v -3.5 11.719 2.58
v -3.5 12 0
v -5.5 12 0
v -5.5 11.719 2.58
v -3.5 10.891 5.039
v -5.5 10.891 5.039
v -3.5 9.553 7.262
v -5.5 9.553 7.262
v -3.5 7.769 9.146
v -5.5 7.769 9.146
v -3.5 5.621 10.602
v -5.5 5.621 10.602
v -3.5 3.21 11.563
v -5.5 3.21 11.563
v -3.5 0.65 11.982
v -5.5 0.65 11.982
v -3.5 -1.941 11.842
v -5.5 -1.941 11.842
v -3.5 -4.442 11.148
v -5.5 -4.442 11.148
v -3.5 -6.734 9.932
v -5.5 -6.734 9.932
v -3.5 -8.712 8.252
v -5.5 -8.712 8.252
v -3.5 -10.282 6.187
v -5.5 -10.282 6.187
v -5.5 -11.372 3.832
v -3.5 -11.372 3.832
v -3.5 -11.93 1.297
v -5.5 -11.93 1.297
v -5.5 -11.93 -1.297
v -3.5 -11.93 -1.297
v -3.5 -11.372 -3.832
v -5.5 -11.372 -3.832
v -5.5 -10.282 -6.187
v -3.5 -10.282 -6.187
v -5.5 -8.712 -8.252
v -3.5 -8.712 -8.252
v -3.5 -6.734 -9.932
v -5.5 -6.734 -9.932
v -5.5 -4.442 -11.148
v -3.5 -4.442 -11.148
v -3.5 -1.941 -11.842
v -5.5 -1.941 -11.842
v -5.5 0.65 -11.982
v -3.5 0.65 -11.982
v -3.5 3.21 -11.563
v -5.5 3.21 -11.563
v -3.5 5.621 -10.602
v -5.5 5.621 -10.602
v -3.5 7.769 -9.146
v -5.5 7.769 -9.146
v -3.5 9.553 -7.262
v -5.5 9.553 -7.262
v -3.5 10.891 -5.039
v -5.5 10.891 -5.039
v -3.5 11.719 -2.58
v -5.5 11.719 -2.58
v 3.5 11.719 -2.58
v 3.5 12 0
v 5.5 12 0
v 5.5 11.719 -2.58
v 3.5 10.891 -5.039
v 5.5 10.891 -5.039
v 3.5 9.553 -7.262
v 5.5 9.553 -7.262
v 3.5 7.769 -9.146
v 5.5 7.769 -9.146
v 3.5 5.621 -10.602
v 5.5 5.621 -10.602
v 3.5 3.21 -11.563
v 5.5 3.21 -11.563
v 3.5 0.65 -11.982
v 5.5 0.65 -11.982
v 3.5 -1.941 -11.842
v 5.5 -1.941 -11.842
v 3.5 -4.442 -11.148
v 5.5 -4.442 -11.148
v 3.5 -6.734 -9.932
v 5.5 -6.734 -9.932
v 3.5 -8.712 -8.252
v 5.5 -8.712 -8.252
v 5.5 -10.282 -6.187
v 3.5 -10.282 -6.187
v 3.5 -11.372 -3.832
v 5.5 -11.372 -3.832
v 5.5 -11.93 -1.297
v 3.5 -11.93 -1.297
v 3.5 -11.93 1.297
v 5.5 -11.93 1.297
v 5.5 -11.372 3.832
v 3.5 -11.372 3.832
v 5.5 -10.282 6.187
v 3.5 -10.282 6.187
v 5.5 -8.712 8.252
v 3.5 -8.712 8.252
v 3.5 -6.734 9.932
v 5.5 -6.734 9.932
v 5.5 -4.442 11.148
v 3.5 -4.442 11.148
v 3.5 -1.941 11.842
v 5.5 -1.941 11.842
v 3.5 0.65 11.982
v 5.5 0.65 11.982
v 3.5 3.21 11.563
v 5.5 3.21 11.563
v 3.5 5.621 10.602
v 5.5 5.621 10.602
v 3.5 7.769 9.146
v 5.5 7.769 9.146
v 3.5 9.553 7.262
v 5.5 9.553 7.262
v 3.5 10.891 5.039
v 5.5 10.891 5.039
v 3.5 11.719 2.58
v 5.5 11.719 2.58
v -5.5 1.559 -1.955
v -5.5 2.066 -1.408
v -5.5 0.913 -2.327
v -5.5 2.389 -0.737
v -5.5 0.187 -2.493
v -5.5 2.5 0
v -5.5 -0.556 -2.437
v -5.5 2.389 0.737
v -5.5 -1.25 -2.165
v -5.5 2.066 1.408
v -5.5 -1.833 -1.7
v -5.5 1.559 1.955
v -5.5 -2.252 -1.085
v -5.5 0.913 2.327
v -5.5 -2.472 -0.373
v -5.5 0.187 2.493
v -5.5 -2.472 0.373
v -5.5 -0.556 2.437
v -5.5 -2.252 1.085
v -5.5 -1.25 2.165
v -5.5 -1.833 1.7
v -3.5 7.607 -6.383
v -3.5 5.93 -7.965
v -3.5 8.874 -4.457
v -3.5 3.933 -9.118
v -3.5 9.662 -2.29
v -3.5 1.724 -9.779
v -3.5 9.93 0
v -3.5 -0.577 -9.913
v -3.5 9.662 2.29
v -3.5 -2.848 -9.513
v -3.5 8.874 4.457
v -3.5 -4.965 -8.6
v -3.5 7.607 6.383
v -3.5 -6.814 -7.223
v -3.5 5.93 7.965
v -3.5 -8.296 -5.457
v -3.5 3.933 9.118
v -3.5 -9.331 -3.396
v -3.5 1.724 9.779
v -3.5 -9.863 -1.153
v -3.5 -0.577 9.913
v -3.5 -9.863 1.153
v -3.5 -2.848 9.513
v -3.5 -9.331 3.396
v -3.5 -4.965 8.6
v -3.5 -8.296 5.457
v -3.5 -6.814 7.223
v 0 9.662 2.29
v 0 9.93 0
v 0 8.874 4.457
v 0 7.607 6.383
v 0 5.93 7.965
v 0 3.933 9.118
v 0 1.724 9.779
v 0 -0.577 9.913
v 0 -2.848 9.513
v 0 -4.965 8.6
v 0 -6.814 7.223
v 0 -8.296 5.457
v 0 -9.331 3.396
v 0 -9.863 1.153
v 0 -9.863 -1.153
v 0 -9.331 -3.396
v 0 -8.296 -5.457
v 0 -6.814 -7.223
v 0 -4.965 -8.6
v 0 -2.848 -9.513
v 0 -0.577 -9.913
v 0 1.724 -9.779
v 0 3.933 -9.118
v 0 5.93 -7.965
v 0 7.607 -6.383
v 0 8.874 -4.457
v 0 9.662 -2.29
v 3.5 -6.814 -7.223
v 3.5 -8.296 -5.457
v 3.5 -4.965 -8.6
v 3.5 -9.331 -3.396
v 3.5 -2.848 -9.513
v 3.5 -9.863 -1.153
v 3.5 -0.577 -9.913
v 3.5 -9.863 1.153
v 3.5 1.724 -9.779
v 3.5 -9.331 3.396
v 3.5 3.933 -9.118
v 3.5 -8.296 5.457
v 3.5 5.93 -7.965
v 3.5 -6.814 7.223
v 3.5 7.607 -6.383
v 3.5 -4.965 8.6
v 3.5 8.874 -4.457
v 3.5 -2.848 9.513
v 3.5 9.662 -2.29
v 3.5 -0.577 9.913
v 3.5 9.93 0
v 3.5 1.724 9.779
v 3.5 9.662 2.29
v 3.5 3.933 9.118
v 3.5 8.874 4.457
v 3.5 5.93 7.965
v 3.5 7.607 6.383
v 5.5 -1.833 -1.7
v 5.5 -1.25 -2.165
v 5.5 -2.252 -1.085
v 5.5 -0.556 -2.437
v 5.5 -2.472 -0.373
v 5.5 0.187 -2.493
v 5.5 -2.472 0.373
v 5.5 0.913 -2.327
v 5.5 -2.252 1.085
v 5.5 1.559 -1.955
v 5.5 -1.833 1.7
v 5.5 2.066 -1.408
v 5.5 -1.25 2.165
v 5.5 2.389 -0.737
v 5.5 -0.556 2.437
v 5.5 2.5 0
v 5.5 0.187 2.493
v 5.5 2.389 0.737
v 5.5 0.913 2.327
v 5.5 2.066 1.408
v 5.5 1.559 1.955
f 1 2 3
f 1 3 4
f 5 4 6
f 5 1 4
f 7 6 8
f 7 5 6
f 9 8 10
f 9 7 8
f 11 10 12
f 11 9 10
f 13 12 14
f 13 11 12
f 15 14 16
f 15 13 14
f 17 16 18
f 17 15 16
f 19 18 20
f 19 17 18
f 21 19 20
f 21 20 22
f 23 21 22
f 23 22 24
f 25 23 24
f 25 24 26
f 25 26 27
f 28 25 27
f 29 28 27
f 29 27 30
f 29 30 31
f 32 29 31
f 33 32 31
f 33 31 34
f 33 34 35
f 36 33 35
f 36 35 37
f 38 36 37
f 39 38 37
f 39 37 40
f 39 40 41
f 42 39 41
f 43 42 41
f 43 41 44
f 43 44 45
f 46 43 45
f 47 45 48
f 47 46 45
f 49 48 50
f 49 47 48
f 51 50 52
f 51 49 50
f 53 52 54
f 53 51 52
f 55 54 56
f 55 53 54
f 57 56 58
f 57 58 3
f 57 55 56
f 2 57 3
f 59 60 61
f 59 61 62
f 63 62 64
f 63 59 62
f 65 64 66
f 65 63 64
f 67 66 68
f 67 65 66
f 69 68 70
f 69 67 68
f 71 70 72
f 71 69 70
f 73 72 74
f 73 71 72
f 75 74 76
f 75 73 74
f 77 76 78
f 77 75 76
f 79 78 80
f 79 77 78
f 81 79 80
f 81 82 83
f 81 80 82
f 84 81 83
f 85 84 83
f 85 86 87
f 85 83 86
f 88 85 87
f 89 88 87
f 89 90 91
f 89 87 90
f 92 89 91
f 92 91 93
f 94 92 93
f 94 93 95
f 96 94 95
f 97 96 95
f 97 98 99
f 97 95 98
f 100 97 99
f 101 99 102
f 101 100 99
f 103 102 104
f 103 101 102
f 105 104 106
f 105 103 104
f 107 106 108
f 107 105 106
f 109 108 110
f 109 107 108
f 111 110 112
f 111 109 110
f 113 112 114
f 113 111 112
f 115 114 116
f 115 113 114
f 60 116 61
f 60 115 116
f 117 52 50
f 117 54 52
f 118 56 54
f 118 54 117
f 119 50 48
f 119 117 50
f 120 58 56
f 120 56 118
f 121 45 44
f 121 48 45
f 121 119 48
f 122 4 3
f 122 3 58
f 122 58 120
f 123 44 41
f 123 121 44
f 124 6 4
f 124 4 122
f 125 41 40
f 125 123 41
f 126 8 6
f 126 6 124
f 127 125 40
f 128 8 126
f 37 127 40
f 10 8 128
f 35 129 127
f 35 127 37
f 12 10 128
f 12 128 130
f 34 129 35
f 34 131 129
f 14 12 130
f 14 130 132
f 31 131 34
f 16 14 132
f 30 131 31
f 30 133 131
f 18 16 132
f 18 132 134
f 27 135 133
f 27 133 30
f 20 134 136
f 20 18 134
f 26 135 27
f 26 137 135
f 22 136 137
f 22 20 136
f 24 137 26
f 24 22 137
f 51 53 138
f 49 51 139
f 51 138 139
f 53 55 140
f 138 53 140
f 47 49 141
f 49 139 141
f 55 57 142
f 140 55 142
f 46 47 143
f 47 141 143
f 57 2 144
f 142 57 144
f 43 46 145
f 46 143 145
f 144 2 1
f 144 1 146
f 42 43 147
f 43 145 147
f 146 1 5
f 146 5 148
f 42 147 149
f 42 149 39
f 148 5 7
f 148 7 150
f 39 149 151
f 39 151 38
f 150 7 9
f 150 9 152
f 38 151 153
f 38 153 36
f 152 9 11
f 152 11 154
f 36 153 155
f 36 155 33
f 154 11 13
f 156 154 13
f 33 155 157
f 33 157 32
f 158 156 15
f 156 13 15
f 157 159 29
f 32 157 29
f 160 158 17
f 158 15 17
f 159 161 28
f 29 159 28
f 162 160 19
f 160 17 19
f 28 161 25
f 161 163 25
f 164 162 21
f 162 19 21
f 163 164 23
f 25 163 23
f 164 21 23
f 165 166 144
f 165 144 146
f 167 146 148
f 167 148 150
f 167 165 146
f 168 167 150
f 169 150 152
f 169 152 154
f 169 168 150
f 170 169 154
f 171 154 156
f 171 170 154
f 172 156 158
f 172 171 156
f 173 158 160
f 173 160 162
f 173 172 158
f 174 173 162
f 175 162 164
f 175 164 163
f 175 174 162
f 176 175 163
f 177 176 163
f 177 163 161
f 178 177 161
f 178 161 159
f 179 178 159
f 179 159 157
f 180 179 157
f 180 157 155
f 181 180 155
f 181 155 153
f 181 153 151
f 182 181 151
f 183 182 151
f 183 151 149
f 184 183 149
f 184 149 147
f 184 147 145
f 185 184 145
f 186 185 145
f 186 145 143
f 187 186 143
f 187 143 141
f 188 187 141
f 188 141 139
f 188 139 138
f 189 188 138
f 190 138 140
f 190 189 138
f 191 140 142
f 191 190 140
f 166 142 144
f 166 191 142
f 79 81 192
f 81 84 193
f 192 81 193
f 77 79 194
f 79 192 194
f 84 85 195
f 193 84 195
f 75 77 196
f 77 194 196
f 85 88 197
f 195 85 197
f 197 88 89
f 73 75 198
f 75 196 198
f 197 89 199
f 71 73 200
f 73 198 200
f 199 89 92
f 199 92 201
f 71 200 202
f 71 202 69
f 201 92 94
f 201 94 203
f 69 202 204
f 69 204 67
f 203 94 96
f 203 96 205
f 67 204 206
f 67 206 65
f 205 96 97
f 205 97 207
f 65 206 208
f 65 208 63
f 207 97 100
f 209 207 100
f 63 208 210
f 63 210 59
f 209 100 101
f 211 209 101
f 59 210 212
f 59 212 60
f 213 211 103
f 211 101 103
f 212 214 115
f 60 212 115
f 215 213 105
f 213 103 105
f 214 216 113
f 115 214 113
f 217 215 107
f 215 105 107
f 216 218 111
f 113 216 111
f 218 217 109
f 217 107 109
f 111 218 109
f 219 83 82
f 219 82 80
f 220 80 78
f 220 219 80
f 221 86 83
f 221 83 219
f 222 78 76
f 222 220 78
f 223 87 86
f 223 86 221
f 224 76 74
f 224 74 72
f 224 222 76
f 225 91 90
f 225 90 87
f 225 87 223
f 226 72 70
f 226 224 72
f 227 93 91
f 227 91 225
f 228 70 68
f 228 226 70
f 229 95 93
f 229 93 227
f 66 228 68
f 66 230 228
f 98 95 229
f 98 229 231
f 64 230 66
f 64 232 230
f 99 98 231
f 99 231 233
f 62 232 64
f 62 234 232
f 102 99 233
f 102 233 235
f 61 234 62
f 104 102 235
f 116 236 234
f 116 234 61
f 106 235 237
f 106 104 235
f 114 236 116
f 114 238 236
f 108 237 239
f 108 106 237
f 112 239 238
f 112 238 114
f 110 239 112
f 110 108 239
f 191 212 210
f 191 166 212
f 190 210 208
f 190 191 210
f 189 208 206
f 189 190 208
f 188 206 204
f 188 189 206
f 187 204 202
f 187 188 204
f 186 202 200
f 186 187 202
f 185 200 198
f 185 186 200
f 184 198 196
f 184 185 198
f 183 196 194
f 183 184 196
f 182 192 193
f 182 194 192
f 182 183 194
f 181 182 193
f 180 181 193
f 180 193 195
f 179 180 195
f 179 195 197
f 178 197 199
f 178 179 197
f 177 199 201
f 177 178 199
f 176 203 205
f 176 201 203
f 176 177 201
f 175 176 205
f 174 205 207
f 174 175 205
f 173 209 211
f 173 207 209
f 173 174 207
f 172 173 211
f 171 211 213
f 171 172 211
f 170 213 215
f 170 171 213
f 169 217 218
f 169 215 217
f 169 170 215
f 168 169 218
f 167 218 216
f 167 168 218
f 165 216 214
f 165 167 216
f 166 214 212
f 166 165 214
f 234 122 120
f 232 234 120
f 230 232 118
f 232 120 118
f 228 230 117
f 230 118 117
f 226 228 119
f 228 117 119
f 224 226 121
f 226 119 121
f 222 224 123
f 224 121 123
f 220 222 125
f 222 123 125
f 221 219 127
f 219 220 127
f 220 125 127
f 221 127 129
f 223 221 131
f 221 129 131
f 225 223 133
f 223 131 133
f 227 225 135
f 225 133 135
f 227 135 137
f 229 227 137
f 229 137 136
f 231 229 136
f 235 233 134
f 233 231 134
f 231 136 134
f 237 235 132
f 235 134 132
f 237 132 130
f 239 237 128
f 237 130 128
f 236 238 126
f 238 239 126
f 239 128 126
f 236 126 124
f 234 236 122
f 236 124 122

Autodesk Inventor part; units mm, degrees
ref_plane "YZ Plane" through (0, 0, 0) normal (1, 0, 0) x (0, 1, 0)
ref_plane "XZ Plane" through (0, 0, 0) normal (0, 1, 0) x (-1, 0, 0)
ref_plane "XY Plane" through (0, 0, 0) normal (0, 0, 1) x (1, 0, 0)
sketch "Sketch1" plane through (0, 0, 0) normal (0, 0, 1) x (1, 0, 0)
  line L0 (5.5, 2.5) -> (5.5, 12)
  line L1 (5.5, 12) -> (3.5, 12)
  line L2 (3.5, 12) -> (3.5, 9.93)
  line L3 (3.5, 9.93) -> (0, 9.93)
  line L4 (5.5, 2.5) -> (0, 2.5)
  line L5 (0, 2.5) -> (0, 9.93)
  line L6 (-2.3, 0) -> (6.8, 0) projected
  line L7 (0, 0) -> (0, 17.5) projected
  line L8 (0, 9) -> (0, 2.5)
  line L9 (0, 15) -> (0, 9)
  point P0 (0, 6.215)
  point P1 (-1, 12)
  point P2 (4.5, 12)
  dimension "d0" = 5.5
  dimension "d1" = 3.5
  dimension "d2" = 9.93
  dimension "d3" = 12
  dimension "d4" = 2.5
  dimension "d8" = 1
revolve "Revolution1" add sketch "Sketch1" angle 360 about axis through (-10, 0, 0) along (1, 0, 0)
mirror "Mirror2" about plane through (0, 0, 0) normal (1, 0, 0) of "Revolution1"
properties part number "Belt_Pulley" material "Aluminum 6061"
